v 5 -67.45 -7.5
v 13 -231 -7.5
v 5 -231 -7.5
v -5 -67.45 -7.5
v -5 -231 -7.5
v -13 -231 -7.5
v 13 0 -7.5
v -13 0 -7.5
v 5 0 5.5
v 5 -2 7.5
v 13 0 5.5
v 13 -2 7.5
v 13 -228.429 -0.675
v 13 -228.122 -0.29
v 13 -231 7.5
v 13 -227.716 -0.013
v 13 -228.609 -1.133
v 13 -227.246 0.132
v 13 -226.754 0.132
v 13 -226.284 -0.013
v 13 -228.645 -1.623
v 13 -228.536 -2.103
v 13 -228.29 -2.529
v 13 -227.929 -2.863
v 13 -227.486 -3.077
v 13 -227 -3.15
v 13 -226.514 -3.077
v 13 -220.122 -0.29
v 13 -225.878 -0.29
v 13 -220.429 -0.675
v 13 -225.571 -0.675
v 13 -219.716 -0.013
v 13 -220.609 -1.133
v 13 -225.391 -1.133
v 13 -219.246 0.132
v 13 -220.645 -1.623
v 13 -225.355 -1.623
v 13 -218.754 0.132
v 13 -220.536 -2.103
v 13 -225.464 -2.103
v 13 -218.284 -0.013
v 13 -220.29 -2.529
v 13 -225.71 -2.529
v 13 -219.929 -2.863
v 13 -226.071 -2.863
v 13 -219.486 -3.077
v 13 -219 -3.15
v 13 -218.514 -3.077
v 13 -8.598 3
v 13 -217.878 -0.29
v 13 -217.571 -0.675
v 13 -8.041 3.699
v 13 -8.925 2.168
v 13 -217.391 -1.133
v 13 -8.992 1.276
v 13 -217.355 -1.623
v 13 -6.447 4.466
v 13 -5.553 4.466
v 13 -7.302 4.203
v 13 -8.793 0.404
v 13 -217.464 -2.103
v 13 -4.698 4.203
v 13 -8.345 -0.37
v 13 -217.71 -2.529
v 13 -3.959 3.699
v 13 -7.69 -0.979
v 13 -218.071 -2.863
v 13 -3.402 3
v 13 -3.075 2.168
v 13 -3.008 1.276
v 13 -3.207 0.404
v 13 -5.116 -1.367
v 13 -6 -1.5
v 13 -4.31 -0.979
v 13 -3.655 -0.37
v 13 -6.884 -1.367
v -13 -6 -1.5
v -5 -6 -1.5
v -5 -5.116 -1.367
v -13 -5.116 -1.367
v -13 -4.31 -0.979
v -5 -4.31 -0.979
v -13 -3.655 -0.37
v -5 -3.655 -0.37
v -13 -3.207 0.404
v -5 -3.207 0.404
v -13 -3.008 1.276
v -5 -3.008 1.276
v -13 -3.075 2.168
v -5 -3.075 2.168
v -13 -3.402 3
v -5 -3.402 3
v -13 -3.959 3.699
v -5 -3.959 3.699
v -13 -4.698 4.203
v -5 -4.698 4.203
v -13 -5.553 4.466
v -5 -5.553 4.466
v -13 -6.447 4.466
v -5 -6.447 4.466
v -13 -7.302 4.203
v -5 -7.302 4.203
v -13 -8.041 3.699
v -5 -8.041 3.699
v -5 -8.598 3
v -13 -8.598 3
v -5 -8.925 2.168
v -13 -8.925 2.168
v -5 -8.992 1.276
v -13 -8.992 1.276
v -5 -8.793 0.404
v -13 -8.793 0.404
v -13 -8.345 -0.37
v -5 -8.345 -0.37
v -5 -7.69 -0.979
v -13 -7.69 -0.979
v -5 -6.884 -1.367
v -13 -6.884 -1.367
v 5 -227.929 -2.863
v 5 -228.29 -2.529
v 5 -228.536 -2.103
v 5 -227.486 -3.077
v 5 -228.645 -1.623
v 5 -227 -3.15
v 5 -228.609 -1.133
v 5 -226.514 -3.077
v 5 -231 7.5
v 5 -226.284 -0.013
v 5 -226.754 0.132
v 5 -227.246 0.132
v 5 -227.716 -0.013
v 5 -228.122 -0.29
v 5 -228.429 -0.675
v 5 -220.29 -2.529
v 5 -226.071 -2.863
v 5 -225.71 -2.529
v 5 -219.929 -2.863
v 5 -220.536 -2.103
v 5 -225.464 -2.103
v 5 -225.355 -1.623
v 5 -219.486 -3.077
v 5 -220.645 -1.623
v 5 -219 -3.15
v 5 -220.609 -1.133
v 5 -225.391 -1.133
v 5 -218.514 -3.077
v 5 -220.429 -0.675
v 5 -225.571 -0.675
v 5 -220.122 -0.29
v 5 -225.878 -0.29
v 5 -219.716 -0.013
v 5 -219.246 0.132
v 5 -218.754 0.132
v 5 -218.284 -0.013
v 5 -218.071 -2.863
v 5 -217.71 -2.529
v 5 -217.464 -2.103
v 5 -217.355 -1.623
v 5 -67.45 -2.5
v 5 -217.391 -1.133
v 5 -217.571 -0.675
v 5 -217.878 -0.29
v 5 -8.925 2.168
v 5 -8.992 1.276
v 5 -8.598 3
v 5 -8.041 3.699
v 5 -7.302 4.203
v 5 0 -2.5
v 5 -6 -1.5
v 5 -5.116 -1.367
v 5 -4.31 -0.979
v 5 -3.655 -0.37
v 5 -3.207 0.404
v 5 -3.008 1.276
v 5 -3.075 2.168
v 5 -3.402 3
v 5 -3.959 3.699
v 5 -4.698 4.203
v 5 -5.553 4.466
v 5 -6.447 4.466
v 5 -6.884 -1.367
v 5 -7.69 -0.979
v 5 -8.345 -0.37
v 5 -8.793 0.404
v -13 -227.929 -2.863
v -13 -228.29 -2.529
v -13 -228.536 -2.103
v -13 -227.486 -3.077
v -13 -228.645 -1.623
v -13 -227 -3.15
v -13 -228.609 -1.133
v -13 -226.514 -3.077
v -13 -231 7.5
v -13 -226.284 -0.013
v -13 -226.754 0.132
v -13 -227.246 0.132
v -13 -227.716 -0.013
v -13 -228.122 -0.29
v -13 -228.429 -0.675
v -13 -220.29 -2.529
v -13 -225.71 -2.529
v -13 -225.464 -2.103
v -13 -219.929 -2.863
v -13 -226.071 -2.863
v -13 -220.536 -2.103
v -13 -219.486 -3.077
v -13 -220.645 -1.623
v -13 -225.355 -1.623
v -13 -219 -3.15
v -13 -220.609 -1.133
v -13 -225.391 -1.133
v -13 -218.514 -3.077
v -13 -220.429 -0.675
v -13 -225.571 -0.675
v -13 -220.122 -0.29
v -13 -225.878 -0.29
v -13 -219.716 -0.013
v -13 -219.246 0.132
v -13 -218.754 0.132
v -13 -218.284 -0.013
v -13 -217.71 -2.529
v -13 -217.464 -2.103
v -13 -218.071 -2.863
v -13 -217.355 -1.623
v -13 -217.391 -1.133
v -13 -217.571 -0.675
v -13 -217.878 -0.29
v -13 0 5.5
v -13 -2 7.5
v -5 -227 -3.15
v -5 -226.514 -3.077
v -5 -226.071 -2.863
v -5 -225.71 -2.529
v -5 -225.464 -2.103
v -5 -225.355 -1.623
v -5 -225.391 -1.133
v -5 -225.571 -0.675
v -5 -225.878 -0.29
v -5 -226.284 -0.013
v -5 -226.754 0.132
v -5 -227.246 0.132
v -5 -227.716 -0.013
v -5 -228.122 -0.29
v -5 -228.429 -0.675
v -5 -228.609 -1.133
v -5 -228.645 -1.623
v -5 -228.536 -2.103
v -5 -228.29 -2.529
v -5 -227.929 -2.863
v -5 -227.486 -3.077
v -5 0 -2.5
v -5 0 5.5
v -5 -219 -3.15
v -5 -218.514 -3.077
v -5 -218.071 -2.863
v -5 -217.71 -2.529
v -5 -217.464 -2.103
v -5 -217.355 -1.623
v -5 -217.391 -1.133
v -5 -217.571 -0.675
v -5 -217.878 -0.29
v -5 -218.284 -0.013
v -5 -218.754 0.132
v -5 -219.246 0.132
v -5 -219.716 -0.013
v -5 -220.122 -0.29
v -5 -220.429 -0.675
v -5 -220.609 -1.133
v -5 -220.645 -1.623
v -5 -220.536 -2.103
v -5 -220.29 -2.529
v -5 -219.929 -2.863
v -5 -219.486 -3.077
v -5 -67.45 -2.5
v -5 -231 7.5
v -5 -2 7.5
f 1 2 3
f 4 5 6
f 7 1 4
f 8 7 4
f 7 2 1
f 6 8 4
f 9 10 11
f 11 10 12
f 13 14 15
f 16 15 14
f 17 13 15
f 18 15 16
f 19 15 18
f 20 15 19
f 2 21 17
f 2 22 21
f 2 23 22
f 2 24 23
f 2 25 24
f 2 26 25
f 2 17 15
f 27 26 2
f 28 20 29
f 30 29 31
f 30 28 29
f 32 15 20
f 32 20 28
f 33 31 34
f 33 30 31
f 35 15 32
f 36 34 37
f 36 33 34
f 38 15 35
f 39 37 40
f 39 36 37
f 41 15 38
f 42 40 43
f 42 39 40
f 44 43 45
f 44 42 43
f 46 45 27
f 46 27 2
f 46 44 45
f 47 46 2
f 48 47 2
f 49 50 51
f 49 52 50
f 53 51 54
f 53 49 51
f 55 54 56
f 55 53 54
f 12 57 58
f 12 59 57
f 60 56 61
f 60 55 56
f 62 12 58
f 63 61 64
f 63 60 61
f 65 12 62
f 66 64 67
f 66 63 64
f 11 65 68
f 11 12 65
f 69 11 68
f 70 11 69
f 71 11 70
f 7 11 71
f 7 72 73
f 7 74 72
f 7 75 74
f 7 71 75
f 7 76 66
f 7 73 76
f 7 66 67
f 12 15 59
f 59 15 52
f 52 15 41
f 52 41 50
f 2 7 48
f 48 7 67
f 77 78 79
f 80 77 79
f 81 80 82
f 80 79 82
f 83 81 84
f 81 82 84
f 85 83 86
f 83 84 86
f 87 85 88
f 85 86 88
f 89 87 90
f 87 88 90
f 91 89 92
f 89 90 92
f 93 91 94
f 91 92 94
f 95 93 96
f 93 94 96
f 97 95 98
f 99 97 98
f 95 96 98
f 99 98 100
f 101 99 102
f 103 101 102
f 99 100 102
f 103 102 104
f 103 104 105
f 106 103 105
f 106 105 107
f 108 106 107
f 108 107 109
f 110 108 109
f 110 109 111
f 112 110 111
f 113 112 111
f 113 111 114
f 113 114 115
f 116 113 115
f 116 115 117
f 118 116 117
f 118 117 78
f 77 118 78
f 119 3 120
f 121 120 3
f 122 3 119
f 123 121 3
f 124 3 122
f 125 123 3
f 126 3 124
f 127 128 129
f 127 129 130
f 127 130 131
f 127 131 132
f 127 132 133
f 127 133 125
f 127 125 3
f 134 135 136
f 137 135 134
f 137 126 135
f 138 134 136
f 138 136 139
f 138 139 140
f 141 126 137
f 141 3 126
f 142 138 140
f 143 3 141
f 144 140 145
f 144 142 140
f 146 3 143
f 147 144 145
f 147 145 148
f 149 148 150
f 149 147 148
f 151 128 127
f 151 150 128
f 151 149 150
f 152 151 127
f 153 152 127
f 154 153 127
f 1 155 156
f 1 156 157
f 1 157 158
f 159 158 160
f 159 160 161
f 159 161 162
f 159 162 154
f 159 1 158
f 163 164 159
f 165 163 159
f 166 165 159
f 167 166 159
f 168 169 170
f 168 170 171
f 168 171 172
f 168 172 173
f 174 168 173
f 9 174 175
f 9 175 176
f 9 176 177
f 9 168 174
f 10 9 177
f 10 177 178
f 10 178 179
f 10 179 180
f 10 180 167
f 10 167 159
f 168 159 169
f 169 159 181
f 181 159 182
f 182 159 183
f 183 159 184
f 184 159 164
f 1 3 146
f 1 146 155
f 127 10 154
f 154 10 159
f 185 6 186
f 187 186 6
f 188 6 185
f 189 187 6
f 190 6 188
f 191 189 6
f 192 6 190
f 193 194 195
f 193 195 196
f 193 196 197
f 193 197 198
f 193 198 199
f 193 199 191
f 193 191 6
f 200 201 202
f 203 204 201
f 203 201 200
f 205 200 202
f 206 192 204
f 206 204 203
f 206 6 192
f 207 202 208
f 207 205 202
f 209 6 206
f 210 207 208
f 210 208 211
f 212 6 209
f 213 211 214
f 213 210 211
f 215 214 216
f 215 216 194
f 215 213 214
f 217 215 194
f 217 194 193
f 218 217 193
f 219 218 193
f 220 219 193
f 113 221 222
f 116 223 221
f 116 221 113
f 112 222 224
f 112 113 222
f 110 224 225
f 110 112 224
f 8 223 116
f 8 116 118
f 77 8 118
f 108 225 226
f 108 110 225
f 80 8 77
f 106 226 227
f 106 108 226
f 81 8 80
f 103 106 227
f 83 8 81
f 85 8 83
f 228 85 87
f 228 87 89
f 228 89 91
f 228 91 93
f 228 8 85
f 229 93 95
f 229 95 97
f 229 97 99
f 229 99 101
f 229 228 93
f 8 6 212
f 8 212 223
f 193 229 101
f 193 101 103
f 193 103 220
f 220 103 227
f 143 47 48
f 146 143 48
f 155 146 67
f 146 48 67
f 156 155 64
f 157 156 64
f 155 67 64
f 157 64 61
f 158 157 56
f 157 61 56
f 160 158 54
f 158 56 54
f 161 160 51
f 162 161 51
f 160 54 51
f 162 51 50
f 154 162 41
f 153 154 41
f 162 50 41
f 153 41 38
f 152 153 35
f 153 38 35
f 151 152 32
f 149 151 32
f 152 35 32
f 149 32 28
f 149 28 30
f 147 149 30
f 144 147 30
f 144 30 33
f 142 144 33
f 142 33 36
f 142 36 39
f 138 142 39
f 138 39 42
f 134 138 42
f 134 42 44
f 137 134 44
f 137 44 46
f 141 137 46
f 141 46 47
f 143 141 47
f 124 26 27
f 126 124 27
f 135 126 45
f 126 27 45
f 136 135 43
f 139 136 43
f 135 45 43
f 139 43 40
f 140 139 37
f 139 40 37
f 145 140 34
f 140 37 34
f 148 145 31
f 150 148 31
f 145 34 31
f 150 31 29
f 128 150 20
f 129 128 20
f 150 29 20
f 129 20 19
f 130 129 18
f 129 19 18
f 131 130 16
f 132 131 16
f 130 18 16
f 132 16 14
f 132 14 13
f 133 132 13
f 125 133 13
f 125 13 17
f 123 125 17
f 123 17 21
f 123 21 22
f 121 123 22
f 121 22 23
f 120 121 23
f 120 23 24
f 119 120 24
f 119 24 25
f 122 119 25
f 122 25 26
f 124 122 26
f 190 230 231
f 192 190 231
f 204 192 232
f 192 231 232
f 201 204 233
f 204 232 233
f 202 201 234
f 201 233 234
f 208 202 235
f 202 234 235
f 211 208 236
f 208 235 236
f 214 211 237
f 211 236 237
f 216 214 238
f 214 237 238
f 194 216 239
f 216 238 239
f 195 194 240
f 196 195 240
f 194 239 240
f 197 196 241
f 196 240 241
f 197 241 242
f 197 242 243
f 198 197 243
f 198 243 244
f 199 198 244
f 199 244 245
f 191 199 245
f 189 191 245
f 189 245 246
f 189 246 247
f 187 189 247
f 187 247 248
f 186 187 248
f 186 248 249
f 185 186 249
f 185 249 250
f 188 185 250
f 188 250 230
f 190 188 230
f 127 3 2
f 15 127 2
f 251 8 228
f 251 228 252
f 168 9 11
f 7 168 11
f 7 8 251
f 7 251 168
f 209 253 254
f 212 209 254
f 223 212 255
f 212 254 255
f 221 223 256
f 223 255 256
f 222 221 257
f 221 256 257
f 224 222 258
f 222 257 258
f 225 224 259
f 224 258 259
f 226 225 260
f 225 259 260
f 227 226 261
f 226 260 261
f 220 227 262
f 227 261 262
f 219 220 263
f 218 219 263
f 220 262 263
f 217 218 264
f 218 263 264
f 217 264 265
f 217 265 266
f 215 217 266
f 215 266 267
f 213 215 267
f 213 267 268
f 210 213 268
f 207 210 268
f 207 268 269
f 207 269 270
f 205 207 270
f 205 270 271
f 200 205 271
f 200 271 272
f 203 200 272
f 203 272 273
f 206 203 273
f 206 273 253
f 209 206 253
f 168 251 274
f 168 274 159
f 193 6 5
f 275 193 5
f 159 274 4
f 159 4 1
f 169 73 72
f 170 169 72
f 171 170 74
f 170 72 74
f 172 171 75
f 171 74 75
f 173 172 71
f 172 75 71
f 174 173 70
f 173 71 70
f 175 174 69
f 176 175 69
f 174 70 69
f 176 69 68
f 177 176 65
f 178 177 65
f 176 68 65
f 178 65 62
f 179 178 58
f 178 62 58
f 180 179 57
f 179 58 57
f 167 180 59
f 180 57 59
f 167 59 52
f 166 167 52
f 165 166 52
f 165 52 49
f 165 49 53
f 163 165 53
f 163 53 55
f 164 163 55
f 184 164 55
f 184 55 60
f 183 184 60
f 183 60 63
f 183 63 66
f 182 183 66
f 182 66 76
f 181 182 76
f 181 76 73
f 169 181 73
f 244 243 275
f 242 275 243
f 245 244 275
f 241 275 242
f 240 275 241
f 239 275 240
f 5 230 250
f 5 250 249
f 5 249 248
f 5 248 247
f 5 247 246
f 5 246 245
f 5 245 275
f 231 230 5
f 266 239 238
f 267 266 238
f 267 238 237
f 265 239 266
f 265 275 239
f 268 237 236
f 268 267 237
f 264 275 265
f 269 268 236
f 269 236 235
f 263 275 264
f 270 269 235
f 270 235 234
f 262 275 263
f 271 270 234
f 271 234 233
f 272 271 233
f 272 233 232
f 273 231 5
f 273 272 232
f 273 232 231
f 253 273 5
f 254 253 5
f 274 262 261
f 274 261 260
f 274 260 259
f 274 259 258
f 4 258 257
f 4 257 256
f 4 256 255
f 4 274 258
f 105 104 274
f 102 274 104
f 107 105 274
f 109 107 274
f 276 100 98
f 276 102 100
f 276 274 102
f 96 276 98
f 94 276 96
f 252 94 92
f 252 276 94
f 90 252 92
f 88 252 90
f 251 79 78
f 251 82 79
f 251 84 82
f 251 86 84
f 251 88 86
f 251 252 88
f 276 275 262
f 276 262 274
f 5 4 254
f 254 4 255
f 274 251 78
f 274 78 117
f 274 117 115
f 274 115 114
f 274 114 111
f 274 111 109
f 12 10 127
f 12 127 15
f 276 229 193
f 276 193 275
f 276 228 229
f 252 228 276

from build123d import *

# Parameters (mm, degrees)
EXTRUDE_1_DEPTH     = 231
SKETCH_2_R          = 3
CUT_EXTRUDE_1_DEPTH = 233.579556281
HOLE_WIZARD_M4_1_D  = 3.3
CHAMFER_1_SIZE      = 2
CUT_EXTRUDE_3_REACH = 233.582
SKETCH_8_W          = 10
SKETCH_8_H          = 168.002742078


with BuildPart() as part:
    # 草图1 → 凸台-拉伸1 (new body)
    with BuildSketch(Plane(origin=(0, 0, 0), x_dir=(1, 0, 0), z_dir=(0, 1, 0))):
        Polygon((-13, -7.5), (-5, -7.5), (-5, 2.5), (5, 2.5), (5, -7.5), (13, -7.5), (13, 7.5), (-13, 7.5), align=None)
    extrude(amount=-EXTRUDE_1_DEPTH)

    # 草图2 → 切除-拉伸1 (cut, through all)
    with BuildSketch(Plane(origin=(13, 0, 0), x_dir=(0, 0, -1), z_dir=(1, 0, 0))):
        with Locations((-1.5, -6)):
            Circle(SKETCH_2_R)
    extrude(amount=-CUT_EXTRUDE_1_DEPTH, mode=Mode.SUBTRACT)

    # M4 螺纹孔1 (through all)
    with Locations(Plane.ZY.offset(13)):
        with Locations((-1.5, -227), (-1.5, -219)):
            Hole(HOLE_WIZARD_M4_1_D / 2)

    # 倒角1
    chamfer_1_edges = [part.edges().sort_by_distance(p)[0] for p in [
        (9, 0, 7.5),
        (-9, 0, 7.5),
    ]]
    chamfer(chamfer_1_edges, length=CHAMFER_1_SIZE)

    # 草图8 → 切除-拉伸3 (cut, up to next)
    with BuildSketch(Plane.XY.offset(-2.5), mode=Mode.PRIVATE) as cut_extrude_3_sk1:
        with Locations((0, -151.451371039)):
            Rectangle(SKETCH_8_W, SKETCH_8_H)
    cut_extrude_3_tool1 = extrude(cut_extrude_3_sk1.sketch, amount=-CUT_EXTRUDE_3_REACH, mode=Mode.PRIVATE) & part.part
    add(cut_extrude_3_tool1.solids().sort_by_distance((0, -151.451371, -2.5))[0], mode=Mode.SUBTRACT)


solid = part.part
